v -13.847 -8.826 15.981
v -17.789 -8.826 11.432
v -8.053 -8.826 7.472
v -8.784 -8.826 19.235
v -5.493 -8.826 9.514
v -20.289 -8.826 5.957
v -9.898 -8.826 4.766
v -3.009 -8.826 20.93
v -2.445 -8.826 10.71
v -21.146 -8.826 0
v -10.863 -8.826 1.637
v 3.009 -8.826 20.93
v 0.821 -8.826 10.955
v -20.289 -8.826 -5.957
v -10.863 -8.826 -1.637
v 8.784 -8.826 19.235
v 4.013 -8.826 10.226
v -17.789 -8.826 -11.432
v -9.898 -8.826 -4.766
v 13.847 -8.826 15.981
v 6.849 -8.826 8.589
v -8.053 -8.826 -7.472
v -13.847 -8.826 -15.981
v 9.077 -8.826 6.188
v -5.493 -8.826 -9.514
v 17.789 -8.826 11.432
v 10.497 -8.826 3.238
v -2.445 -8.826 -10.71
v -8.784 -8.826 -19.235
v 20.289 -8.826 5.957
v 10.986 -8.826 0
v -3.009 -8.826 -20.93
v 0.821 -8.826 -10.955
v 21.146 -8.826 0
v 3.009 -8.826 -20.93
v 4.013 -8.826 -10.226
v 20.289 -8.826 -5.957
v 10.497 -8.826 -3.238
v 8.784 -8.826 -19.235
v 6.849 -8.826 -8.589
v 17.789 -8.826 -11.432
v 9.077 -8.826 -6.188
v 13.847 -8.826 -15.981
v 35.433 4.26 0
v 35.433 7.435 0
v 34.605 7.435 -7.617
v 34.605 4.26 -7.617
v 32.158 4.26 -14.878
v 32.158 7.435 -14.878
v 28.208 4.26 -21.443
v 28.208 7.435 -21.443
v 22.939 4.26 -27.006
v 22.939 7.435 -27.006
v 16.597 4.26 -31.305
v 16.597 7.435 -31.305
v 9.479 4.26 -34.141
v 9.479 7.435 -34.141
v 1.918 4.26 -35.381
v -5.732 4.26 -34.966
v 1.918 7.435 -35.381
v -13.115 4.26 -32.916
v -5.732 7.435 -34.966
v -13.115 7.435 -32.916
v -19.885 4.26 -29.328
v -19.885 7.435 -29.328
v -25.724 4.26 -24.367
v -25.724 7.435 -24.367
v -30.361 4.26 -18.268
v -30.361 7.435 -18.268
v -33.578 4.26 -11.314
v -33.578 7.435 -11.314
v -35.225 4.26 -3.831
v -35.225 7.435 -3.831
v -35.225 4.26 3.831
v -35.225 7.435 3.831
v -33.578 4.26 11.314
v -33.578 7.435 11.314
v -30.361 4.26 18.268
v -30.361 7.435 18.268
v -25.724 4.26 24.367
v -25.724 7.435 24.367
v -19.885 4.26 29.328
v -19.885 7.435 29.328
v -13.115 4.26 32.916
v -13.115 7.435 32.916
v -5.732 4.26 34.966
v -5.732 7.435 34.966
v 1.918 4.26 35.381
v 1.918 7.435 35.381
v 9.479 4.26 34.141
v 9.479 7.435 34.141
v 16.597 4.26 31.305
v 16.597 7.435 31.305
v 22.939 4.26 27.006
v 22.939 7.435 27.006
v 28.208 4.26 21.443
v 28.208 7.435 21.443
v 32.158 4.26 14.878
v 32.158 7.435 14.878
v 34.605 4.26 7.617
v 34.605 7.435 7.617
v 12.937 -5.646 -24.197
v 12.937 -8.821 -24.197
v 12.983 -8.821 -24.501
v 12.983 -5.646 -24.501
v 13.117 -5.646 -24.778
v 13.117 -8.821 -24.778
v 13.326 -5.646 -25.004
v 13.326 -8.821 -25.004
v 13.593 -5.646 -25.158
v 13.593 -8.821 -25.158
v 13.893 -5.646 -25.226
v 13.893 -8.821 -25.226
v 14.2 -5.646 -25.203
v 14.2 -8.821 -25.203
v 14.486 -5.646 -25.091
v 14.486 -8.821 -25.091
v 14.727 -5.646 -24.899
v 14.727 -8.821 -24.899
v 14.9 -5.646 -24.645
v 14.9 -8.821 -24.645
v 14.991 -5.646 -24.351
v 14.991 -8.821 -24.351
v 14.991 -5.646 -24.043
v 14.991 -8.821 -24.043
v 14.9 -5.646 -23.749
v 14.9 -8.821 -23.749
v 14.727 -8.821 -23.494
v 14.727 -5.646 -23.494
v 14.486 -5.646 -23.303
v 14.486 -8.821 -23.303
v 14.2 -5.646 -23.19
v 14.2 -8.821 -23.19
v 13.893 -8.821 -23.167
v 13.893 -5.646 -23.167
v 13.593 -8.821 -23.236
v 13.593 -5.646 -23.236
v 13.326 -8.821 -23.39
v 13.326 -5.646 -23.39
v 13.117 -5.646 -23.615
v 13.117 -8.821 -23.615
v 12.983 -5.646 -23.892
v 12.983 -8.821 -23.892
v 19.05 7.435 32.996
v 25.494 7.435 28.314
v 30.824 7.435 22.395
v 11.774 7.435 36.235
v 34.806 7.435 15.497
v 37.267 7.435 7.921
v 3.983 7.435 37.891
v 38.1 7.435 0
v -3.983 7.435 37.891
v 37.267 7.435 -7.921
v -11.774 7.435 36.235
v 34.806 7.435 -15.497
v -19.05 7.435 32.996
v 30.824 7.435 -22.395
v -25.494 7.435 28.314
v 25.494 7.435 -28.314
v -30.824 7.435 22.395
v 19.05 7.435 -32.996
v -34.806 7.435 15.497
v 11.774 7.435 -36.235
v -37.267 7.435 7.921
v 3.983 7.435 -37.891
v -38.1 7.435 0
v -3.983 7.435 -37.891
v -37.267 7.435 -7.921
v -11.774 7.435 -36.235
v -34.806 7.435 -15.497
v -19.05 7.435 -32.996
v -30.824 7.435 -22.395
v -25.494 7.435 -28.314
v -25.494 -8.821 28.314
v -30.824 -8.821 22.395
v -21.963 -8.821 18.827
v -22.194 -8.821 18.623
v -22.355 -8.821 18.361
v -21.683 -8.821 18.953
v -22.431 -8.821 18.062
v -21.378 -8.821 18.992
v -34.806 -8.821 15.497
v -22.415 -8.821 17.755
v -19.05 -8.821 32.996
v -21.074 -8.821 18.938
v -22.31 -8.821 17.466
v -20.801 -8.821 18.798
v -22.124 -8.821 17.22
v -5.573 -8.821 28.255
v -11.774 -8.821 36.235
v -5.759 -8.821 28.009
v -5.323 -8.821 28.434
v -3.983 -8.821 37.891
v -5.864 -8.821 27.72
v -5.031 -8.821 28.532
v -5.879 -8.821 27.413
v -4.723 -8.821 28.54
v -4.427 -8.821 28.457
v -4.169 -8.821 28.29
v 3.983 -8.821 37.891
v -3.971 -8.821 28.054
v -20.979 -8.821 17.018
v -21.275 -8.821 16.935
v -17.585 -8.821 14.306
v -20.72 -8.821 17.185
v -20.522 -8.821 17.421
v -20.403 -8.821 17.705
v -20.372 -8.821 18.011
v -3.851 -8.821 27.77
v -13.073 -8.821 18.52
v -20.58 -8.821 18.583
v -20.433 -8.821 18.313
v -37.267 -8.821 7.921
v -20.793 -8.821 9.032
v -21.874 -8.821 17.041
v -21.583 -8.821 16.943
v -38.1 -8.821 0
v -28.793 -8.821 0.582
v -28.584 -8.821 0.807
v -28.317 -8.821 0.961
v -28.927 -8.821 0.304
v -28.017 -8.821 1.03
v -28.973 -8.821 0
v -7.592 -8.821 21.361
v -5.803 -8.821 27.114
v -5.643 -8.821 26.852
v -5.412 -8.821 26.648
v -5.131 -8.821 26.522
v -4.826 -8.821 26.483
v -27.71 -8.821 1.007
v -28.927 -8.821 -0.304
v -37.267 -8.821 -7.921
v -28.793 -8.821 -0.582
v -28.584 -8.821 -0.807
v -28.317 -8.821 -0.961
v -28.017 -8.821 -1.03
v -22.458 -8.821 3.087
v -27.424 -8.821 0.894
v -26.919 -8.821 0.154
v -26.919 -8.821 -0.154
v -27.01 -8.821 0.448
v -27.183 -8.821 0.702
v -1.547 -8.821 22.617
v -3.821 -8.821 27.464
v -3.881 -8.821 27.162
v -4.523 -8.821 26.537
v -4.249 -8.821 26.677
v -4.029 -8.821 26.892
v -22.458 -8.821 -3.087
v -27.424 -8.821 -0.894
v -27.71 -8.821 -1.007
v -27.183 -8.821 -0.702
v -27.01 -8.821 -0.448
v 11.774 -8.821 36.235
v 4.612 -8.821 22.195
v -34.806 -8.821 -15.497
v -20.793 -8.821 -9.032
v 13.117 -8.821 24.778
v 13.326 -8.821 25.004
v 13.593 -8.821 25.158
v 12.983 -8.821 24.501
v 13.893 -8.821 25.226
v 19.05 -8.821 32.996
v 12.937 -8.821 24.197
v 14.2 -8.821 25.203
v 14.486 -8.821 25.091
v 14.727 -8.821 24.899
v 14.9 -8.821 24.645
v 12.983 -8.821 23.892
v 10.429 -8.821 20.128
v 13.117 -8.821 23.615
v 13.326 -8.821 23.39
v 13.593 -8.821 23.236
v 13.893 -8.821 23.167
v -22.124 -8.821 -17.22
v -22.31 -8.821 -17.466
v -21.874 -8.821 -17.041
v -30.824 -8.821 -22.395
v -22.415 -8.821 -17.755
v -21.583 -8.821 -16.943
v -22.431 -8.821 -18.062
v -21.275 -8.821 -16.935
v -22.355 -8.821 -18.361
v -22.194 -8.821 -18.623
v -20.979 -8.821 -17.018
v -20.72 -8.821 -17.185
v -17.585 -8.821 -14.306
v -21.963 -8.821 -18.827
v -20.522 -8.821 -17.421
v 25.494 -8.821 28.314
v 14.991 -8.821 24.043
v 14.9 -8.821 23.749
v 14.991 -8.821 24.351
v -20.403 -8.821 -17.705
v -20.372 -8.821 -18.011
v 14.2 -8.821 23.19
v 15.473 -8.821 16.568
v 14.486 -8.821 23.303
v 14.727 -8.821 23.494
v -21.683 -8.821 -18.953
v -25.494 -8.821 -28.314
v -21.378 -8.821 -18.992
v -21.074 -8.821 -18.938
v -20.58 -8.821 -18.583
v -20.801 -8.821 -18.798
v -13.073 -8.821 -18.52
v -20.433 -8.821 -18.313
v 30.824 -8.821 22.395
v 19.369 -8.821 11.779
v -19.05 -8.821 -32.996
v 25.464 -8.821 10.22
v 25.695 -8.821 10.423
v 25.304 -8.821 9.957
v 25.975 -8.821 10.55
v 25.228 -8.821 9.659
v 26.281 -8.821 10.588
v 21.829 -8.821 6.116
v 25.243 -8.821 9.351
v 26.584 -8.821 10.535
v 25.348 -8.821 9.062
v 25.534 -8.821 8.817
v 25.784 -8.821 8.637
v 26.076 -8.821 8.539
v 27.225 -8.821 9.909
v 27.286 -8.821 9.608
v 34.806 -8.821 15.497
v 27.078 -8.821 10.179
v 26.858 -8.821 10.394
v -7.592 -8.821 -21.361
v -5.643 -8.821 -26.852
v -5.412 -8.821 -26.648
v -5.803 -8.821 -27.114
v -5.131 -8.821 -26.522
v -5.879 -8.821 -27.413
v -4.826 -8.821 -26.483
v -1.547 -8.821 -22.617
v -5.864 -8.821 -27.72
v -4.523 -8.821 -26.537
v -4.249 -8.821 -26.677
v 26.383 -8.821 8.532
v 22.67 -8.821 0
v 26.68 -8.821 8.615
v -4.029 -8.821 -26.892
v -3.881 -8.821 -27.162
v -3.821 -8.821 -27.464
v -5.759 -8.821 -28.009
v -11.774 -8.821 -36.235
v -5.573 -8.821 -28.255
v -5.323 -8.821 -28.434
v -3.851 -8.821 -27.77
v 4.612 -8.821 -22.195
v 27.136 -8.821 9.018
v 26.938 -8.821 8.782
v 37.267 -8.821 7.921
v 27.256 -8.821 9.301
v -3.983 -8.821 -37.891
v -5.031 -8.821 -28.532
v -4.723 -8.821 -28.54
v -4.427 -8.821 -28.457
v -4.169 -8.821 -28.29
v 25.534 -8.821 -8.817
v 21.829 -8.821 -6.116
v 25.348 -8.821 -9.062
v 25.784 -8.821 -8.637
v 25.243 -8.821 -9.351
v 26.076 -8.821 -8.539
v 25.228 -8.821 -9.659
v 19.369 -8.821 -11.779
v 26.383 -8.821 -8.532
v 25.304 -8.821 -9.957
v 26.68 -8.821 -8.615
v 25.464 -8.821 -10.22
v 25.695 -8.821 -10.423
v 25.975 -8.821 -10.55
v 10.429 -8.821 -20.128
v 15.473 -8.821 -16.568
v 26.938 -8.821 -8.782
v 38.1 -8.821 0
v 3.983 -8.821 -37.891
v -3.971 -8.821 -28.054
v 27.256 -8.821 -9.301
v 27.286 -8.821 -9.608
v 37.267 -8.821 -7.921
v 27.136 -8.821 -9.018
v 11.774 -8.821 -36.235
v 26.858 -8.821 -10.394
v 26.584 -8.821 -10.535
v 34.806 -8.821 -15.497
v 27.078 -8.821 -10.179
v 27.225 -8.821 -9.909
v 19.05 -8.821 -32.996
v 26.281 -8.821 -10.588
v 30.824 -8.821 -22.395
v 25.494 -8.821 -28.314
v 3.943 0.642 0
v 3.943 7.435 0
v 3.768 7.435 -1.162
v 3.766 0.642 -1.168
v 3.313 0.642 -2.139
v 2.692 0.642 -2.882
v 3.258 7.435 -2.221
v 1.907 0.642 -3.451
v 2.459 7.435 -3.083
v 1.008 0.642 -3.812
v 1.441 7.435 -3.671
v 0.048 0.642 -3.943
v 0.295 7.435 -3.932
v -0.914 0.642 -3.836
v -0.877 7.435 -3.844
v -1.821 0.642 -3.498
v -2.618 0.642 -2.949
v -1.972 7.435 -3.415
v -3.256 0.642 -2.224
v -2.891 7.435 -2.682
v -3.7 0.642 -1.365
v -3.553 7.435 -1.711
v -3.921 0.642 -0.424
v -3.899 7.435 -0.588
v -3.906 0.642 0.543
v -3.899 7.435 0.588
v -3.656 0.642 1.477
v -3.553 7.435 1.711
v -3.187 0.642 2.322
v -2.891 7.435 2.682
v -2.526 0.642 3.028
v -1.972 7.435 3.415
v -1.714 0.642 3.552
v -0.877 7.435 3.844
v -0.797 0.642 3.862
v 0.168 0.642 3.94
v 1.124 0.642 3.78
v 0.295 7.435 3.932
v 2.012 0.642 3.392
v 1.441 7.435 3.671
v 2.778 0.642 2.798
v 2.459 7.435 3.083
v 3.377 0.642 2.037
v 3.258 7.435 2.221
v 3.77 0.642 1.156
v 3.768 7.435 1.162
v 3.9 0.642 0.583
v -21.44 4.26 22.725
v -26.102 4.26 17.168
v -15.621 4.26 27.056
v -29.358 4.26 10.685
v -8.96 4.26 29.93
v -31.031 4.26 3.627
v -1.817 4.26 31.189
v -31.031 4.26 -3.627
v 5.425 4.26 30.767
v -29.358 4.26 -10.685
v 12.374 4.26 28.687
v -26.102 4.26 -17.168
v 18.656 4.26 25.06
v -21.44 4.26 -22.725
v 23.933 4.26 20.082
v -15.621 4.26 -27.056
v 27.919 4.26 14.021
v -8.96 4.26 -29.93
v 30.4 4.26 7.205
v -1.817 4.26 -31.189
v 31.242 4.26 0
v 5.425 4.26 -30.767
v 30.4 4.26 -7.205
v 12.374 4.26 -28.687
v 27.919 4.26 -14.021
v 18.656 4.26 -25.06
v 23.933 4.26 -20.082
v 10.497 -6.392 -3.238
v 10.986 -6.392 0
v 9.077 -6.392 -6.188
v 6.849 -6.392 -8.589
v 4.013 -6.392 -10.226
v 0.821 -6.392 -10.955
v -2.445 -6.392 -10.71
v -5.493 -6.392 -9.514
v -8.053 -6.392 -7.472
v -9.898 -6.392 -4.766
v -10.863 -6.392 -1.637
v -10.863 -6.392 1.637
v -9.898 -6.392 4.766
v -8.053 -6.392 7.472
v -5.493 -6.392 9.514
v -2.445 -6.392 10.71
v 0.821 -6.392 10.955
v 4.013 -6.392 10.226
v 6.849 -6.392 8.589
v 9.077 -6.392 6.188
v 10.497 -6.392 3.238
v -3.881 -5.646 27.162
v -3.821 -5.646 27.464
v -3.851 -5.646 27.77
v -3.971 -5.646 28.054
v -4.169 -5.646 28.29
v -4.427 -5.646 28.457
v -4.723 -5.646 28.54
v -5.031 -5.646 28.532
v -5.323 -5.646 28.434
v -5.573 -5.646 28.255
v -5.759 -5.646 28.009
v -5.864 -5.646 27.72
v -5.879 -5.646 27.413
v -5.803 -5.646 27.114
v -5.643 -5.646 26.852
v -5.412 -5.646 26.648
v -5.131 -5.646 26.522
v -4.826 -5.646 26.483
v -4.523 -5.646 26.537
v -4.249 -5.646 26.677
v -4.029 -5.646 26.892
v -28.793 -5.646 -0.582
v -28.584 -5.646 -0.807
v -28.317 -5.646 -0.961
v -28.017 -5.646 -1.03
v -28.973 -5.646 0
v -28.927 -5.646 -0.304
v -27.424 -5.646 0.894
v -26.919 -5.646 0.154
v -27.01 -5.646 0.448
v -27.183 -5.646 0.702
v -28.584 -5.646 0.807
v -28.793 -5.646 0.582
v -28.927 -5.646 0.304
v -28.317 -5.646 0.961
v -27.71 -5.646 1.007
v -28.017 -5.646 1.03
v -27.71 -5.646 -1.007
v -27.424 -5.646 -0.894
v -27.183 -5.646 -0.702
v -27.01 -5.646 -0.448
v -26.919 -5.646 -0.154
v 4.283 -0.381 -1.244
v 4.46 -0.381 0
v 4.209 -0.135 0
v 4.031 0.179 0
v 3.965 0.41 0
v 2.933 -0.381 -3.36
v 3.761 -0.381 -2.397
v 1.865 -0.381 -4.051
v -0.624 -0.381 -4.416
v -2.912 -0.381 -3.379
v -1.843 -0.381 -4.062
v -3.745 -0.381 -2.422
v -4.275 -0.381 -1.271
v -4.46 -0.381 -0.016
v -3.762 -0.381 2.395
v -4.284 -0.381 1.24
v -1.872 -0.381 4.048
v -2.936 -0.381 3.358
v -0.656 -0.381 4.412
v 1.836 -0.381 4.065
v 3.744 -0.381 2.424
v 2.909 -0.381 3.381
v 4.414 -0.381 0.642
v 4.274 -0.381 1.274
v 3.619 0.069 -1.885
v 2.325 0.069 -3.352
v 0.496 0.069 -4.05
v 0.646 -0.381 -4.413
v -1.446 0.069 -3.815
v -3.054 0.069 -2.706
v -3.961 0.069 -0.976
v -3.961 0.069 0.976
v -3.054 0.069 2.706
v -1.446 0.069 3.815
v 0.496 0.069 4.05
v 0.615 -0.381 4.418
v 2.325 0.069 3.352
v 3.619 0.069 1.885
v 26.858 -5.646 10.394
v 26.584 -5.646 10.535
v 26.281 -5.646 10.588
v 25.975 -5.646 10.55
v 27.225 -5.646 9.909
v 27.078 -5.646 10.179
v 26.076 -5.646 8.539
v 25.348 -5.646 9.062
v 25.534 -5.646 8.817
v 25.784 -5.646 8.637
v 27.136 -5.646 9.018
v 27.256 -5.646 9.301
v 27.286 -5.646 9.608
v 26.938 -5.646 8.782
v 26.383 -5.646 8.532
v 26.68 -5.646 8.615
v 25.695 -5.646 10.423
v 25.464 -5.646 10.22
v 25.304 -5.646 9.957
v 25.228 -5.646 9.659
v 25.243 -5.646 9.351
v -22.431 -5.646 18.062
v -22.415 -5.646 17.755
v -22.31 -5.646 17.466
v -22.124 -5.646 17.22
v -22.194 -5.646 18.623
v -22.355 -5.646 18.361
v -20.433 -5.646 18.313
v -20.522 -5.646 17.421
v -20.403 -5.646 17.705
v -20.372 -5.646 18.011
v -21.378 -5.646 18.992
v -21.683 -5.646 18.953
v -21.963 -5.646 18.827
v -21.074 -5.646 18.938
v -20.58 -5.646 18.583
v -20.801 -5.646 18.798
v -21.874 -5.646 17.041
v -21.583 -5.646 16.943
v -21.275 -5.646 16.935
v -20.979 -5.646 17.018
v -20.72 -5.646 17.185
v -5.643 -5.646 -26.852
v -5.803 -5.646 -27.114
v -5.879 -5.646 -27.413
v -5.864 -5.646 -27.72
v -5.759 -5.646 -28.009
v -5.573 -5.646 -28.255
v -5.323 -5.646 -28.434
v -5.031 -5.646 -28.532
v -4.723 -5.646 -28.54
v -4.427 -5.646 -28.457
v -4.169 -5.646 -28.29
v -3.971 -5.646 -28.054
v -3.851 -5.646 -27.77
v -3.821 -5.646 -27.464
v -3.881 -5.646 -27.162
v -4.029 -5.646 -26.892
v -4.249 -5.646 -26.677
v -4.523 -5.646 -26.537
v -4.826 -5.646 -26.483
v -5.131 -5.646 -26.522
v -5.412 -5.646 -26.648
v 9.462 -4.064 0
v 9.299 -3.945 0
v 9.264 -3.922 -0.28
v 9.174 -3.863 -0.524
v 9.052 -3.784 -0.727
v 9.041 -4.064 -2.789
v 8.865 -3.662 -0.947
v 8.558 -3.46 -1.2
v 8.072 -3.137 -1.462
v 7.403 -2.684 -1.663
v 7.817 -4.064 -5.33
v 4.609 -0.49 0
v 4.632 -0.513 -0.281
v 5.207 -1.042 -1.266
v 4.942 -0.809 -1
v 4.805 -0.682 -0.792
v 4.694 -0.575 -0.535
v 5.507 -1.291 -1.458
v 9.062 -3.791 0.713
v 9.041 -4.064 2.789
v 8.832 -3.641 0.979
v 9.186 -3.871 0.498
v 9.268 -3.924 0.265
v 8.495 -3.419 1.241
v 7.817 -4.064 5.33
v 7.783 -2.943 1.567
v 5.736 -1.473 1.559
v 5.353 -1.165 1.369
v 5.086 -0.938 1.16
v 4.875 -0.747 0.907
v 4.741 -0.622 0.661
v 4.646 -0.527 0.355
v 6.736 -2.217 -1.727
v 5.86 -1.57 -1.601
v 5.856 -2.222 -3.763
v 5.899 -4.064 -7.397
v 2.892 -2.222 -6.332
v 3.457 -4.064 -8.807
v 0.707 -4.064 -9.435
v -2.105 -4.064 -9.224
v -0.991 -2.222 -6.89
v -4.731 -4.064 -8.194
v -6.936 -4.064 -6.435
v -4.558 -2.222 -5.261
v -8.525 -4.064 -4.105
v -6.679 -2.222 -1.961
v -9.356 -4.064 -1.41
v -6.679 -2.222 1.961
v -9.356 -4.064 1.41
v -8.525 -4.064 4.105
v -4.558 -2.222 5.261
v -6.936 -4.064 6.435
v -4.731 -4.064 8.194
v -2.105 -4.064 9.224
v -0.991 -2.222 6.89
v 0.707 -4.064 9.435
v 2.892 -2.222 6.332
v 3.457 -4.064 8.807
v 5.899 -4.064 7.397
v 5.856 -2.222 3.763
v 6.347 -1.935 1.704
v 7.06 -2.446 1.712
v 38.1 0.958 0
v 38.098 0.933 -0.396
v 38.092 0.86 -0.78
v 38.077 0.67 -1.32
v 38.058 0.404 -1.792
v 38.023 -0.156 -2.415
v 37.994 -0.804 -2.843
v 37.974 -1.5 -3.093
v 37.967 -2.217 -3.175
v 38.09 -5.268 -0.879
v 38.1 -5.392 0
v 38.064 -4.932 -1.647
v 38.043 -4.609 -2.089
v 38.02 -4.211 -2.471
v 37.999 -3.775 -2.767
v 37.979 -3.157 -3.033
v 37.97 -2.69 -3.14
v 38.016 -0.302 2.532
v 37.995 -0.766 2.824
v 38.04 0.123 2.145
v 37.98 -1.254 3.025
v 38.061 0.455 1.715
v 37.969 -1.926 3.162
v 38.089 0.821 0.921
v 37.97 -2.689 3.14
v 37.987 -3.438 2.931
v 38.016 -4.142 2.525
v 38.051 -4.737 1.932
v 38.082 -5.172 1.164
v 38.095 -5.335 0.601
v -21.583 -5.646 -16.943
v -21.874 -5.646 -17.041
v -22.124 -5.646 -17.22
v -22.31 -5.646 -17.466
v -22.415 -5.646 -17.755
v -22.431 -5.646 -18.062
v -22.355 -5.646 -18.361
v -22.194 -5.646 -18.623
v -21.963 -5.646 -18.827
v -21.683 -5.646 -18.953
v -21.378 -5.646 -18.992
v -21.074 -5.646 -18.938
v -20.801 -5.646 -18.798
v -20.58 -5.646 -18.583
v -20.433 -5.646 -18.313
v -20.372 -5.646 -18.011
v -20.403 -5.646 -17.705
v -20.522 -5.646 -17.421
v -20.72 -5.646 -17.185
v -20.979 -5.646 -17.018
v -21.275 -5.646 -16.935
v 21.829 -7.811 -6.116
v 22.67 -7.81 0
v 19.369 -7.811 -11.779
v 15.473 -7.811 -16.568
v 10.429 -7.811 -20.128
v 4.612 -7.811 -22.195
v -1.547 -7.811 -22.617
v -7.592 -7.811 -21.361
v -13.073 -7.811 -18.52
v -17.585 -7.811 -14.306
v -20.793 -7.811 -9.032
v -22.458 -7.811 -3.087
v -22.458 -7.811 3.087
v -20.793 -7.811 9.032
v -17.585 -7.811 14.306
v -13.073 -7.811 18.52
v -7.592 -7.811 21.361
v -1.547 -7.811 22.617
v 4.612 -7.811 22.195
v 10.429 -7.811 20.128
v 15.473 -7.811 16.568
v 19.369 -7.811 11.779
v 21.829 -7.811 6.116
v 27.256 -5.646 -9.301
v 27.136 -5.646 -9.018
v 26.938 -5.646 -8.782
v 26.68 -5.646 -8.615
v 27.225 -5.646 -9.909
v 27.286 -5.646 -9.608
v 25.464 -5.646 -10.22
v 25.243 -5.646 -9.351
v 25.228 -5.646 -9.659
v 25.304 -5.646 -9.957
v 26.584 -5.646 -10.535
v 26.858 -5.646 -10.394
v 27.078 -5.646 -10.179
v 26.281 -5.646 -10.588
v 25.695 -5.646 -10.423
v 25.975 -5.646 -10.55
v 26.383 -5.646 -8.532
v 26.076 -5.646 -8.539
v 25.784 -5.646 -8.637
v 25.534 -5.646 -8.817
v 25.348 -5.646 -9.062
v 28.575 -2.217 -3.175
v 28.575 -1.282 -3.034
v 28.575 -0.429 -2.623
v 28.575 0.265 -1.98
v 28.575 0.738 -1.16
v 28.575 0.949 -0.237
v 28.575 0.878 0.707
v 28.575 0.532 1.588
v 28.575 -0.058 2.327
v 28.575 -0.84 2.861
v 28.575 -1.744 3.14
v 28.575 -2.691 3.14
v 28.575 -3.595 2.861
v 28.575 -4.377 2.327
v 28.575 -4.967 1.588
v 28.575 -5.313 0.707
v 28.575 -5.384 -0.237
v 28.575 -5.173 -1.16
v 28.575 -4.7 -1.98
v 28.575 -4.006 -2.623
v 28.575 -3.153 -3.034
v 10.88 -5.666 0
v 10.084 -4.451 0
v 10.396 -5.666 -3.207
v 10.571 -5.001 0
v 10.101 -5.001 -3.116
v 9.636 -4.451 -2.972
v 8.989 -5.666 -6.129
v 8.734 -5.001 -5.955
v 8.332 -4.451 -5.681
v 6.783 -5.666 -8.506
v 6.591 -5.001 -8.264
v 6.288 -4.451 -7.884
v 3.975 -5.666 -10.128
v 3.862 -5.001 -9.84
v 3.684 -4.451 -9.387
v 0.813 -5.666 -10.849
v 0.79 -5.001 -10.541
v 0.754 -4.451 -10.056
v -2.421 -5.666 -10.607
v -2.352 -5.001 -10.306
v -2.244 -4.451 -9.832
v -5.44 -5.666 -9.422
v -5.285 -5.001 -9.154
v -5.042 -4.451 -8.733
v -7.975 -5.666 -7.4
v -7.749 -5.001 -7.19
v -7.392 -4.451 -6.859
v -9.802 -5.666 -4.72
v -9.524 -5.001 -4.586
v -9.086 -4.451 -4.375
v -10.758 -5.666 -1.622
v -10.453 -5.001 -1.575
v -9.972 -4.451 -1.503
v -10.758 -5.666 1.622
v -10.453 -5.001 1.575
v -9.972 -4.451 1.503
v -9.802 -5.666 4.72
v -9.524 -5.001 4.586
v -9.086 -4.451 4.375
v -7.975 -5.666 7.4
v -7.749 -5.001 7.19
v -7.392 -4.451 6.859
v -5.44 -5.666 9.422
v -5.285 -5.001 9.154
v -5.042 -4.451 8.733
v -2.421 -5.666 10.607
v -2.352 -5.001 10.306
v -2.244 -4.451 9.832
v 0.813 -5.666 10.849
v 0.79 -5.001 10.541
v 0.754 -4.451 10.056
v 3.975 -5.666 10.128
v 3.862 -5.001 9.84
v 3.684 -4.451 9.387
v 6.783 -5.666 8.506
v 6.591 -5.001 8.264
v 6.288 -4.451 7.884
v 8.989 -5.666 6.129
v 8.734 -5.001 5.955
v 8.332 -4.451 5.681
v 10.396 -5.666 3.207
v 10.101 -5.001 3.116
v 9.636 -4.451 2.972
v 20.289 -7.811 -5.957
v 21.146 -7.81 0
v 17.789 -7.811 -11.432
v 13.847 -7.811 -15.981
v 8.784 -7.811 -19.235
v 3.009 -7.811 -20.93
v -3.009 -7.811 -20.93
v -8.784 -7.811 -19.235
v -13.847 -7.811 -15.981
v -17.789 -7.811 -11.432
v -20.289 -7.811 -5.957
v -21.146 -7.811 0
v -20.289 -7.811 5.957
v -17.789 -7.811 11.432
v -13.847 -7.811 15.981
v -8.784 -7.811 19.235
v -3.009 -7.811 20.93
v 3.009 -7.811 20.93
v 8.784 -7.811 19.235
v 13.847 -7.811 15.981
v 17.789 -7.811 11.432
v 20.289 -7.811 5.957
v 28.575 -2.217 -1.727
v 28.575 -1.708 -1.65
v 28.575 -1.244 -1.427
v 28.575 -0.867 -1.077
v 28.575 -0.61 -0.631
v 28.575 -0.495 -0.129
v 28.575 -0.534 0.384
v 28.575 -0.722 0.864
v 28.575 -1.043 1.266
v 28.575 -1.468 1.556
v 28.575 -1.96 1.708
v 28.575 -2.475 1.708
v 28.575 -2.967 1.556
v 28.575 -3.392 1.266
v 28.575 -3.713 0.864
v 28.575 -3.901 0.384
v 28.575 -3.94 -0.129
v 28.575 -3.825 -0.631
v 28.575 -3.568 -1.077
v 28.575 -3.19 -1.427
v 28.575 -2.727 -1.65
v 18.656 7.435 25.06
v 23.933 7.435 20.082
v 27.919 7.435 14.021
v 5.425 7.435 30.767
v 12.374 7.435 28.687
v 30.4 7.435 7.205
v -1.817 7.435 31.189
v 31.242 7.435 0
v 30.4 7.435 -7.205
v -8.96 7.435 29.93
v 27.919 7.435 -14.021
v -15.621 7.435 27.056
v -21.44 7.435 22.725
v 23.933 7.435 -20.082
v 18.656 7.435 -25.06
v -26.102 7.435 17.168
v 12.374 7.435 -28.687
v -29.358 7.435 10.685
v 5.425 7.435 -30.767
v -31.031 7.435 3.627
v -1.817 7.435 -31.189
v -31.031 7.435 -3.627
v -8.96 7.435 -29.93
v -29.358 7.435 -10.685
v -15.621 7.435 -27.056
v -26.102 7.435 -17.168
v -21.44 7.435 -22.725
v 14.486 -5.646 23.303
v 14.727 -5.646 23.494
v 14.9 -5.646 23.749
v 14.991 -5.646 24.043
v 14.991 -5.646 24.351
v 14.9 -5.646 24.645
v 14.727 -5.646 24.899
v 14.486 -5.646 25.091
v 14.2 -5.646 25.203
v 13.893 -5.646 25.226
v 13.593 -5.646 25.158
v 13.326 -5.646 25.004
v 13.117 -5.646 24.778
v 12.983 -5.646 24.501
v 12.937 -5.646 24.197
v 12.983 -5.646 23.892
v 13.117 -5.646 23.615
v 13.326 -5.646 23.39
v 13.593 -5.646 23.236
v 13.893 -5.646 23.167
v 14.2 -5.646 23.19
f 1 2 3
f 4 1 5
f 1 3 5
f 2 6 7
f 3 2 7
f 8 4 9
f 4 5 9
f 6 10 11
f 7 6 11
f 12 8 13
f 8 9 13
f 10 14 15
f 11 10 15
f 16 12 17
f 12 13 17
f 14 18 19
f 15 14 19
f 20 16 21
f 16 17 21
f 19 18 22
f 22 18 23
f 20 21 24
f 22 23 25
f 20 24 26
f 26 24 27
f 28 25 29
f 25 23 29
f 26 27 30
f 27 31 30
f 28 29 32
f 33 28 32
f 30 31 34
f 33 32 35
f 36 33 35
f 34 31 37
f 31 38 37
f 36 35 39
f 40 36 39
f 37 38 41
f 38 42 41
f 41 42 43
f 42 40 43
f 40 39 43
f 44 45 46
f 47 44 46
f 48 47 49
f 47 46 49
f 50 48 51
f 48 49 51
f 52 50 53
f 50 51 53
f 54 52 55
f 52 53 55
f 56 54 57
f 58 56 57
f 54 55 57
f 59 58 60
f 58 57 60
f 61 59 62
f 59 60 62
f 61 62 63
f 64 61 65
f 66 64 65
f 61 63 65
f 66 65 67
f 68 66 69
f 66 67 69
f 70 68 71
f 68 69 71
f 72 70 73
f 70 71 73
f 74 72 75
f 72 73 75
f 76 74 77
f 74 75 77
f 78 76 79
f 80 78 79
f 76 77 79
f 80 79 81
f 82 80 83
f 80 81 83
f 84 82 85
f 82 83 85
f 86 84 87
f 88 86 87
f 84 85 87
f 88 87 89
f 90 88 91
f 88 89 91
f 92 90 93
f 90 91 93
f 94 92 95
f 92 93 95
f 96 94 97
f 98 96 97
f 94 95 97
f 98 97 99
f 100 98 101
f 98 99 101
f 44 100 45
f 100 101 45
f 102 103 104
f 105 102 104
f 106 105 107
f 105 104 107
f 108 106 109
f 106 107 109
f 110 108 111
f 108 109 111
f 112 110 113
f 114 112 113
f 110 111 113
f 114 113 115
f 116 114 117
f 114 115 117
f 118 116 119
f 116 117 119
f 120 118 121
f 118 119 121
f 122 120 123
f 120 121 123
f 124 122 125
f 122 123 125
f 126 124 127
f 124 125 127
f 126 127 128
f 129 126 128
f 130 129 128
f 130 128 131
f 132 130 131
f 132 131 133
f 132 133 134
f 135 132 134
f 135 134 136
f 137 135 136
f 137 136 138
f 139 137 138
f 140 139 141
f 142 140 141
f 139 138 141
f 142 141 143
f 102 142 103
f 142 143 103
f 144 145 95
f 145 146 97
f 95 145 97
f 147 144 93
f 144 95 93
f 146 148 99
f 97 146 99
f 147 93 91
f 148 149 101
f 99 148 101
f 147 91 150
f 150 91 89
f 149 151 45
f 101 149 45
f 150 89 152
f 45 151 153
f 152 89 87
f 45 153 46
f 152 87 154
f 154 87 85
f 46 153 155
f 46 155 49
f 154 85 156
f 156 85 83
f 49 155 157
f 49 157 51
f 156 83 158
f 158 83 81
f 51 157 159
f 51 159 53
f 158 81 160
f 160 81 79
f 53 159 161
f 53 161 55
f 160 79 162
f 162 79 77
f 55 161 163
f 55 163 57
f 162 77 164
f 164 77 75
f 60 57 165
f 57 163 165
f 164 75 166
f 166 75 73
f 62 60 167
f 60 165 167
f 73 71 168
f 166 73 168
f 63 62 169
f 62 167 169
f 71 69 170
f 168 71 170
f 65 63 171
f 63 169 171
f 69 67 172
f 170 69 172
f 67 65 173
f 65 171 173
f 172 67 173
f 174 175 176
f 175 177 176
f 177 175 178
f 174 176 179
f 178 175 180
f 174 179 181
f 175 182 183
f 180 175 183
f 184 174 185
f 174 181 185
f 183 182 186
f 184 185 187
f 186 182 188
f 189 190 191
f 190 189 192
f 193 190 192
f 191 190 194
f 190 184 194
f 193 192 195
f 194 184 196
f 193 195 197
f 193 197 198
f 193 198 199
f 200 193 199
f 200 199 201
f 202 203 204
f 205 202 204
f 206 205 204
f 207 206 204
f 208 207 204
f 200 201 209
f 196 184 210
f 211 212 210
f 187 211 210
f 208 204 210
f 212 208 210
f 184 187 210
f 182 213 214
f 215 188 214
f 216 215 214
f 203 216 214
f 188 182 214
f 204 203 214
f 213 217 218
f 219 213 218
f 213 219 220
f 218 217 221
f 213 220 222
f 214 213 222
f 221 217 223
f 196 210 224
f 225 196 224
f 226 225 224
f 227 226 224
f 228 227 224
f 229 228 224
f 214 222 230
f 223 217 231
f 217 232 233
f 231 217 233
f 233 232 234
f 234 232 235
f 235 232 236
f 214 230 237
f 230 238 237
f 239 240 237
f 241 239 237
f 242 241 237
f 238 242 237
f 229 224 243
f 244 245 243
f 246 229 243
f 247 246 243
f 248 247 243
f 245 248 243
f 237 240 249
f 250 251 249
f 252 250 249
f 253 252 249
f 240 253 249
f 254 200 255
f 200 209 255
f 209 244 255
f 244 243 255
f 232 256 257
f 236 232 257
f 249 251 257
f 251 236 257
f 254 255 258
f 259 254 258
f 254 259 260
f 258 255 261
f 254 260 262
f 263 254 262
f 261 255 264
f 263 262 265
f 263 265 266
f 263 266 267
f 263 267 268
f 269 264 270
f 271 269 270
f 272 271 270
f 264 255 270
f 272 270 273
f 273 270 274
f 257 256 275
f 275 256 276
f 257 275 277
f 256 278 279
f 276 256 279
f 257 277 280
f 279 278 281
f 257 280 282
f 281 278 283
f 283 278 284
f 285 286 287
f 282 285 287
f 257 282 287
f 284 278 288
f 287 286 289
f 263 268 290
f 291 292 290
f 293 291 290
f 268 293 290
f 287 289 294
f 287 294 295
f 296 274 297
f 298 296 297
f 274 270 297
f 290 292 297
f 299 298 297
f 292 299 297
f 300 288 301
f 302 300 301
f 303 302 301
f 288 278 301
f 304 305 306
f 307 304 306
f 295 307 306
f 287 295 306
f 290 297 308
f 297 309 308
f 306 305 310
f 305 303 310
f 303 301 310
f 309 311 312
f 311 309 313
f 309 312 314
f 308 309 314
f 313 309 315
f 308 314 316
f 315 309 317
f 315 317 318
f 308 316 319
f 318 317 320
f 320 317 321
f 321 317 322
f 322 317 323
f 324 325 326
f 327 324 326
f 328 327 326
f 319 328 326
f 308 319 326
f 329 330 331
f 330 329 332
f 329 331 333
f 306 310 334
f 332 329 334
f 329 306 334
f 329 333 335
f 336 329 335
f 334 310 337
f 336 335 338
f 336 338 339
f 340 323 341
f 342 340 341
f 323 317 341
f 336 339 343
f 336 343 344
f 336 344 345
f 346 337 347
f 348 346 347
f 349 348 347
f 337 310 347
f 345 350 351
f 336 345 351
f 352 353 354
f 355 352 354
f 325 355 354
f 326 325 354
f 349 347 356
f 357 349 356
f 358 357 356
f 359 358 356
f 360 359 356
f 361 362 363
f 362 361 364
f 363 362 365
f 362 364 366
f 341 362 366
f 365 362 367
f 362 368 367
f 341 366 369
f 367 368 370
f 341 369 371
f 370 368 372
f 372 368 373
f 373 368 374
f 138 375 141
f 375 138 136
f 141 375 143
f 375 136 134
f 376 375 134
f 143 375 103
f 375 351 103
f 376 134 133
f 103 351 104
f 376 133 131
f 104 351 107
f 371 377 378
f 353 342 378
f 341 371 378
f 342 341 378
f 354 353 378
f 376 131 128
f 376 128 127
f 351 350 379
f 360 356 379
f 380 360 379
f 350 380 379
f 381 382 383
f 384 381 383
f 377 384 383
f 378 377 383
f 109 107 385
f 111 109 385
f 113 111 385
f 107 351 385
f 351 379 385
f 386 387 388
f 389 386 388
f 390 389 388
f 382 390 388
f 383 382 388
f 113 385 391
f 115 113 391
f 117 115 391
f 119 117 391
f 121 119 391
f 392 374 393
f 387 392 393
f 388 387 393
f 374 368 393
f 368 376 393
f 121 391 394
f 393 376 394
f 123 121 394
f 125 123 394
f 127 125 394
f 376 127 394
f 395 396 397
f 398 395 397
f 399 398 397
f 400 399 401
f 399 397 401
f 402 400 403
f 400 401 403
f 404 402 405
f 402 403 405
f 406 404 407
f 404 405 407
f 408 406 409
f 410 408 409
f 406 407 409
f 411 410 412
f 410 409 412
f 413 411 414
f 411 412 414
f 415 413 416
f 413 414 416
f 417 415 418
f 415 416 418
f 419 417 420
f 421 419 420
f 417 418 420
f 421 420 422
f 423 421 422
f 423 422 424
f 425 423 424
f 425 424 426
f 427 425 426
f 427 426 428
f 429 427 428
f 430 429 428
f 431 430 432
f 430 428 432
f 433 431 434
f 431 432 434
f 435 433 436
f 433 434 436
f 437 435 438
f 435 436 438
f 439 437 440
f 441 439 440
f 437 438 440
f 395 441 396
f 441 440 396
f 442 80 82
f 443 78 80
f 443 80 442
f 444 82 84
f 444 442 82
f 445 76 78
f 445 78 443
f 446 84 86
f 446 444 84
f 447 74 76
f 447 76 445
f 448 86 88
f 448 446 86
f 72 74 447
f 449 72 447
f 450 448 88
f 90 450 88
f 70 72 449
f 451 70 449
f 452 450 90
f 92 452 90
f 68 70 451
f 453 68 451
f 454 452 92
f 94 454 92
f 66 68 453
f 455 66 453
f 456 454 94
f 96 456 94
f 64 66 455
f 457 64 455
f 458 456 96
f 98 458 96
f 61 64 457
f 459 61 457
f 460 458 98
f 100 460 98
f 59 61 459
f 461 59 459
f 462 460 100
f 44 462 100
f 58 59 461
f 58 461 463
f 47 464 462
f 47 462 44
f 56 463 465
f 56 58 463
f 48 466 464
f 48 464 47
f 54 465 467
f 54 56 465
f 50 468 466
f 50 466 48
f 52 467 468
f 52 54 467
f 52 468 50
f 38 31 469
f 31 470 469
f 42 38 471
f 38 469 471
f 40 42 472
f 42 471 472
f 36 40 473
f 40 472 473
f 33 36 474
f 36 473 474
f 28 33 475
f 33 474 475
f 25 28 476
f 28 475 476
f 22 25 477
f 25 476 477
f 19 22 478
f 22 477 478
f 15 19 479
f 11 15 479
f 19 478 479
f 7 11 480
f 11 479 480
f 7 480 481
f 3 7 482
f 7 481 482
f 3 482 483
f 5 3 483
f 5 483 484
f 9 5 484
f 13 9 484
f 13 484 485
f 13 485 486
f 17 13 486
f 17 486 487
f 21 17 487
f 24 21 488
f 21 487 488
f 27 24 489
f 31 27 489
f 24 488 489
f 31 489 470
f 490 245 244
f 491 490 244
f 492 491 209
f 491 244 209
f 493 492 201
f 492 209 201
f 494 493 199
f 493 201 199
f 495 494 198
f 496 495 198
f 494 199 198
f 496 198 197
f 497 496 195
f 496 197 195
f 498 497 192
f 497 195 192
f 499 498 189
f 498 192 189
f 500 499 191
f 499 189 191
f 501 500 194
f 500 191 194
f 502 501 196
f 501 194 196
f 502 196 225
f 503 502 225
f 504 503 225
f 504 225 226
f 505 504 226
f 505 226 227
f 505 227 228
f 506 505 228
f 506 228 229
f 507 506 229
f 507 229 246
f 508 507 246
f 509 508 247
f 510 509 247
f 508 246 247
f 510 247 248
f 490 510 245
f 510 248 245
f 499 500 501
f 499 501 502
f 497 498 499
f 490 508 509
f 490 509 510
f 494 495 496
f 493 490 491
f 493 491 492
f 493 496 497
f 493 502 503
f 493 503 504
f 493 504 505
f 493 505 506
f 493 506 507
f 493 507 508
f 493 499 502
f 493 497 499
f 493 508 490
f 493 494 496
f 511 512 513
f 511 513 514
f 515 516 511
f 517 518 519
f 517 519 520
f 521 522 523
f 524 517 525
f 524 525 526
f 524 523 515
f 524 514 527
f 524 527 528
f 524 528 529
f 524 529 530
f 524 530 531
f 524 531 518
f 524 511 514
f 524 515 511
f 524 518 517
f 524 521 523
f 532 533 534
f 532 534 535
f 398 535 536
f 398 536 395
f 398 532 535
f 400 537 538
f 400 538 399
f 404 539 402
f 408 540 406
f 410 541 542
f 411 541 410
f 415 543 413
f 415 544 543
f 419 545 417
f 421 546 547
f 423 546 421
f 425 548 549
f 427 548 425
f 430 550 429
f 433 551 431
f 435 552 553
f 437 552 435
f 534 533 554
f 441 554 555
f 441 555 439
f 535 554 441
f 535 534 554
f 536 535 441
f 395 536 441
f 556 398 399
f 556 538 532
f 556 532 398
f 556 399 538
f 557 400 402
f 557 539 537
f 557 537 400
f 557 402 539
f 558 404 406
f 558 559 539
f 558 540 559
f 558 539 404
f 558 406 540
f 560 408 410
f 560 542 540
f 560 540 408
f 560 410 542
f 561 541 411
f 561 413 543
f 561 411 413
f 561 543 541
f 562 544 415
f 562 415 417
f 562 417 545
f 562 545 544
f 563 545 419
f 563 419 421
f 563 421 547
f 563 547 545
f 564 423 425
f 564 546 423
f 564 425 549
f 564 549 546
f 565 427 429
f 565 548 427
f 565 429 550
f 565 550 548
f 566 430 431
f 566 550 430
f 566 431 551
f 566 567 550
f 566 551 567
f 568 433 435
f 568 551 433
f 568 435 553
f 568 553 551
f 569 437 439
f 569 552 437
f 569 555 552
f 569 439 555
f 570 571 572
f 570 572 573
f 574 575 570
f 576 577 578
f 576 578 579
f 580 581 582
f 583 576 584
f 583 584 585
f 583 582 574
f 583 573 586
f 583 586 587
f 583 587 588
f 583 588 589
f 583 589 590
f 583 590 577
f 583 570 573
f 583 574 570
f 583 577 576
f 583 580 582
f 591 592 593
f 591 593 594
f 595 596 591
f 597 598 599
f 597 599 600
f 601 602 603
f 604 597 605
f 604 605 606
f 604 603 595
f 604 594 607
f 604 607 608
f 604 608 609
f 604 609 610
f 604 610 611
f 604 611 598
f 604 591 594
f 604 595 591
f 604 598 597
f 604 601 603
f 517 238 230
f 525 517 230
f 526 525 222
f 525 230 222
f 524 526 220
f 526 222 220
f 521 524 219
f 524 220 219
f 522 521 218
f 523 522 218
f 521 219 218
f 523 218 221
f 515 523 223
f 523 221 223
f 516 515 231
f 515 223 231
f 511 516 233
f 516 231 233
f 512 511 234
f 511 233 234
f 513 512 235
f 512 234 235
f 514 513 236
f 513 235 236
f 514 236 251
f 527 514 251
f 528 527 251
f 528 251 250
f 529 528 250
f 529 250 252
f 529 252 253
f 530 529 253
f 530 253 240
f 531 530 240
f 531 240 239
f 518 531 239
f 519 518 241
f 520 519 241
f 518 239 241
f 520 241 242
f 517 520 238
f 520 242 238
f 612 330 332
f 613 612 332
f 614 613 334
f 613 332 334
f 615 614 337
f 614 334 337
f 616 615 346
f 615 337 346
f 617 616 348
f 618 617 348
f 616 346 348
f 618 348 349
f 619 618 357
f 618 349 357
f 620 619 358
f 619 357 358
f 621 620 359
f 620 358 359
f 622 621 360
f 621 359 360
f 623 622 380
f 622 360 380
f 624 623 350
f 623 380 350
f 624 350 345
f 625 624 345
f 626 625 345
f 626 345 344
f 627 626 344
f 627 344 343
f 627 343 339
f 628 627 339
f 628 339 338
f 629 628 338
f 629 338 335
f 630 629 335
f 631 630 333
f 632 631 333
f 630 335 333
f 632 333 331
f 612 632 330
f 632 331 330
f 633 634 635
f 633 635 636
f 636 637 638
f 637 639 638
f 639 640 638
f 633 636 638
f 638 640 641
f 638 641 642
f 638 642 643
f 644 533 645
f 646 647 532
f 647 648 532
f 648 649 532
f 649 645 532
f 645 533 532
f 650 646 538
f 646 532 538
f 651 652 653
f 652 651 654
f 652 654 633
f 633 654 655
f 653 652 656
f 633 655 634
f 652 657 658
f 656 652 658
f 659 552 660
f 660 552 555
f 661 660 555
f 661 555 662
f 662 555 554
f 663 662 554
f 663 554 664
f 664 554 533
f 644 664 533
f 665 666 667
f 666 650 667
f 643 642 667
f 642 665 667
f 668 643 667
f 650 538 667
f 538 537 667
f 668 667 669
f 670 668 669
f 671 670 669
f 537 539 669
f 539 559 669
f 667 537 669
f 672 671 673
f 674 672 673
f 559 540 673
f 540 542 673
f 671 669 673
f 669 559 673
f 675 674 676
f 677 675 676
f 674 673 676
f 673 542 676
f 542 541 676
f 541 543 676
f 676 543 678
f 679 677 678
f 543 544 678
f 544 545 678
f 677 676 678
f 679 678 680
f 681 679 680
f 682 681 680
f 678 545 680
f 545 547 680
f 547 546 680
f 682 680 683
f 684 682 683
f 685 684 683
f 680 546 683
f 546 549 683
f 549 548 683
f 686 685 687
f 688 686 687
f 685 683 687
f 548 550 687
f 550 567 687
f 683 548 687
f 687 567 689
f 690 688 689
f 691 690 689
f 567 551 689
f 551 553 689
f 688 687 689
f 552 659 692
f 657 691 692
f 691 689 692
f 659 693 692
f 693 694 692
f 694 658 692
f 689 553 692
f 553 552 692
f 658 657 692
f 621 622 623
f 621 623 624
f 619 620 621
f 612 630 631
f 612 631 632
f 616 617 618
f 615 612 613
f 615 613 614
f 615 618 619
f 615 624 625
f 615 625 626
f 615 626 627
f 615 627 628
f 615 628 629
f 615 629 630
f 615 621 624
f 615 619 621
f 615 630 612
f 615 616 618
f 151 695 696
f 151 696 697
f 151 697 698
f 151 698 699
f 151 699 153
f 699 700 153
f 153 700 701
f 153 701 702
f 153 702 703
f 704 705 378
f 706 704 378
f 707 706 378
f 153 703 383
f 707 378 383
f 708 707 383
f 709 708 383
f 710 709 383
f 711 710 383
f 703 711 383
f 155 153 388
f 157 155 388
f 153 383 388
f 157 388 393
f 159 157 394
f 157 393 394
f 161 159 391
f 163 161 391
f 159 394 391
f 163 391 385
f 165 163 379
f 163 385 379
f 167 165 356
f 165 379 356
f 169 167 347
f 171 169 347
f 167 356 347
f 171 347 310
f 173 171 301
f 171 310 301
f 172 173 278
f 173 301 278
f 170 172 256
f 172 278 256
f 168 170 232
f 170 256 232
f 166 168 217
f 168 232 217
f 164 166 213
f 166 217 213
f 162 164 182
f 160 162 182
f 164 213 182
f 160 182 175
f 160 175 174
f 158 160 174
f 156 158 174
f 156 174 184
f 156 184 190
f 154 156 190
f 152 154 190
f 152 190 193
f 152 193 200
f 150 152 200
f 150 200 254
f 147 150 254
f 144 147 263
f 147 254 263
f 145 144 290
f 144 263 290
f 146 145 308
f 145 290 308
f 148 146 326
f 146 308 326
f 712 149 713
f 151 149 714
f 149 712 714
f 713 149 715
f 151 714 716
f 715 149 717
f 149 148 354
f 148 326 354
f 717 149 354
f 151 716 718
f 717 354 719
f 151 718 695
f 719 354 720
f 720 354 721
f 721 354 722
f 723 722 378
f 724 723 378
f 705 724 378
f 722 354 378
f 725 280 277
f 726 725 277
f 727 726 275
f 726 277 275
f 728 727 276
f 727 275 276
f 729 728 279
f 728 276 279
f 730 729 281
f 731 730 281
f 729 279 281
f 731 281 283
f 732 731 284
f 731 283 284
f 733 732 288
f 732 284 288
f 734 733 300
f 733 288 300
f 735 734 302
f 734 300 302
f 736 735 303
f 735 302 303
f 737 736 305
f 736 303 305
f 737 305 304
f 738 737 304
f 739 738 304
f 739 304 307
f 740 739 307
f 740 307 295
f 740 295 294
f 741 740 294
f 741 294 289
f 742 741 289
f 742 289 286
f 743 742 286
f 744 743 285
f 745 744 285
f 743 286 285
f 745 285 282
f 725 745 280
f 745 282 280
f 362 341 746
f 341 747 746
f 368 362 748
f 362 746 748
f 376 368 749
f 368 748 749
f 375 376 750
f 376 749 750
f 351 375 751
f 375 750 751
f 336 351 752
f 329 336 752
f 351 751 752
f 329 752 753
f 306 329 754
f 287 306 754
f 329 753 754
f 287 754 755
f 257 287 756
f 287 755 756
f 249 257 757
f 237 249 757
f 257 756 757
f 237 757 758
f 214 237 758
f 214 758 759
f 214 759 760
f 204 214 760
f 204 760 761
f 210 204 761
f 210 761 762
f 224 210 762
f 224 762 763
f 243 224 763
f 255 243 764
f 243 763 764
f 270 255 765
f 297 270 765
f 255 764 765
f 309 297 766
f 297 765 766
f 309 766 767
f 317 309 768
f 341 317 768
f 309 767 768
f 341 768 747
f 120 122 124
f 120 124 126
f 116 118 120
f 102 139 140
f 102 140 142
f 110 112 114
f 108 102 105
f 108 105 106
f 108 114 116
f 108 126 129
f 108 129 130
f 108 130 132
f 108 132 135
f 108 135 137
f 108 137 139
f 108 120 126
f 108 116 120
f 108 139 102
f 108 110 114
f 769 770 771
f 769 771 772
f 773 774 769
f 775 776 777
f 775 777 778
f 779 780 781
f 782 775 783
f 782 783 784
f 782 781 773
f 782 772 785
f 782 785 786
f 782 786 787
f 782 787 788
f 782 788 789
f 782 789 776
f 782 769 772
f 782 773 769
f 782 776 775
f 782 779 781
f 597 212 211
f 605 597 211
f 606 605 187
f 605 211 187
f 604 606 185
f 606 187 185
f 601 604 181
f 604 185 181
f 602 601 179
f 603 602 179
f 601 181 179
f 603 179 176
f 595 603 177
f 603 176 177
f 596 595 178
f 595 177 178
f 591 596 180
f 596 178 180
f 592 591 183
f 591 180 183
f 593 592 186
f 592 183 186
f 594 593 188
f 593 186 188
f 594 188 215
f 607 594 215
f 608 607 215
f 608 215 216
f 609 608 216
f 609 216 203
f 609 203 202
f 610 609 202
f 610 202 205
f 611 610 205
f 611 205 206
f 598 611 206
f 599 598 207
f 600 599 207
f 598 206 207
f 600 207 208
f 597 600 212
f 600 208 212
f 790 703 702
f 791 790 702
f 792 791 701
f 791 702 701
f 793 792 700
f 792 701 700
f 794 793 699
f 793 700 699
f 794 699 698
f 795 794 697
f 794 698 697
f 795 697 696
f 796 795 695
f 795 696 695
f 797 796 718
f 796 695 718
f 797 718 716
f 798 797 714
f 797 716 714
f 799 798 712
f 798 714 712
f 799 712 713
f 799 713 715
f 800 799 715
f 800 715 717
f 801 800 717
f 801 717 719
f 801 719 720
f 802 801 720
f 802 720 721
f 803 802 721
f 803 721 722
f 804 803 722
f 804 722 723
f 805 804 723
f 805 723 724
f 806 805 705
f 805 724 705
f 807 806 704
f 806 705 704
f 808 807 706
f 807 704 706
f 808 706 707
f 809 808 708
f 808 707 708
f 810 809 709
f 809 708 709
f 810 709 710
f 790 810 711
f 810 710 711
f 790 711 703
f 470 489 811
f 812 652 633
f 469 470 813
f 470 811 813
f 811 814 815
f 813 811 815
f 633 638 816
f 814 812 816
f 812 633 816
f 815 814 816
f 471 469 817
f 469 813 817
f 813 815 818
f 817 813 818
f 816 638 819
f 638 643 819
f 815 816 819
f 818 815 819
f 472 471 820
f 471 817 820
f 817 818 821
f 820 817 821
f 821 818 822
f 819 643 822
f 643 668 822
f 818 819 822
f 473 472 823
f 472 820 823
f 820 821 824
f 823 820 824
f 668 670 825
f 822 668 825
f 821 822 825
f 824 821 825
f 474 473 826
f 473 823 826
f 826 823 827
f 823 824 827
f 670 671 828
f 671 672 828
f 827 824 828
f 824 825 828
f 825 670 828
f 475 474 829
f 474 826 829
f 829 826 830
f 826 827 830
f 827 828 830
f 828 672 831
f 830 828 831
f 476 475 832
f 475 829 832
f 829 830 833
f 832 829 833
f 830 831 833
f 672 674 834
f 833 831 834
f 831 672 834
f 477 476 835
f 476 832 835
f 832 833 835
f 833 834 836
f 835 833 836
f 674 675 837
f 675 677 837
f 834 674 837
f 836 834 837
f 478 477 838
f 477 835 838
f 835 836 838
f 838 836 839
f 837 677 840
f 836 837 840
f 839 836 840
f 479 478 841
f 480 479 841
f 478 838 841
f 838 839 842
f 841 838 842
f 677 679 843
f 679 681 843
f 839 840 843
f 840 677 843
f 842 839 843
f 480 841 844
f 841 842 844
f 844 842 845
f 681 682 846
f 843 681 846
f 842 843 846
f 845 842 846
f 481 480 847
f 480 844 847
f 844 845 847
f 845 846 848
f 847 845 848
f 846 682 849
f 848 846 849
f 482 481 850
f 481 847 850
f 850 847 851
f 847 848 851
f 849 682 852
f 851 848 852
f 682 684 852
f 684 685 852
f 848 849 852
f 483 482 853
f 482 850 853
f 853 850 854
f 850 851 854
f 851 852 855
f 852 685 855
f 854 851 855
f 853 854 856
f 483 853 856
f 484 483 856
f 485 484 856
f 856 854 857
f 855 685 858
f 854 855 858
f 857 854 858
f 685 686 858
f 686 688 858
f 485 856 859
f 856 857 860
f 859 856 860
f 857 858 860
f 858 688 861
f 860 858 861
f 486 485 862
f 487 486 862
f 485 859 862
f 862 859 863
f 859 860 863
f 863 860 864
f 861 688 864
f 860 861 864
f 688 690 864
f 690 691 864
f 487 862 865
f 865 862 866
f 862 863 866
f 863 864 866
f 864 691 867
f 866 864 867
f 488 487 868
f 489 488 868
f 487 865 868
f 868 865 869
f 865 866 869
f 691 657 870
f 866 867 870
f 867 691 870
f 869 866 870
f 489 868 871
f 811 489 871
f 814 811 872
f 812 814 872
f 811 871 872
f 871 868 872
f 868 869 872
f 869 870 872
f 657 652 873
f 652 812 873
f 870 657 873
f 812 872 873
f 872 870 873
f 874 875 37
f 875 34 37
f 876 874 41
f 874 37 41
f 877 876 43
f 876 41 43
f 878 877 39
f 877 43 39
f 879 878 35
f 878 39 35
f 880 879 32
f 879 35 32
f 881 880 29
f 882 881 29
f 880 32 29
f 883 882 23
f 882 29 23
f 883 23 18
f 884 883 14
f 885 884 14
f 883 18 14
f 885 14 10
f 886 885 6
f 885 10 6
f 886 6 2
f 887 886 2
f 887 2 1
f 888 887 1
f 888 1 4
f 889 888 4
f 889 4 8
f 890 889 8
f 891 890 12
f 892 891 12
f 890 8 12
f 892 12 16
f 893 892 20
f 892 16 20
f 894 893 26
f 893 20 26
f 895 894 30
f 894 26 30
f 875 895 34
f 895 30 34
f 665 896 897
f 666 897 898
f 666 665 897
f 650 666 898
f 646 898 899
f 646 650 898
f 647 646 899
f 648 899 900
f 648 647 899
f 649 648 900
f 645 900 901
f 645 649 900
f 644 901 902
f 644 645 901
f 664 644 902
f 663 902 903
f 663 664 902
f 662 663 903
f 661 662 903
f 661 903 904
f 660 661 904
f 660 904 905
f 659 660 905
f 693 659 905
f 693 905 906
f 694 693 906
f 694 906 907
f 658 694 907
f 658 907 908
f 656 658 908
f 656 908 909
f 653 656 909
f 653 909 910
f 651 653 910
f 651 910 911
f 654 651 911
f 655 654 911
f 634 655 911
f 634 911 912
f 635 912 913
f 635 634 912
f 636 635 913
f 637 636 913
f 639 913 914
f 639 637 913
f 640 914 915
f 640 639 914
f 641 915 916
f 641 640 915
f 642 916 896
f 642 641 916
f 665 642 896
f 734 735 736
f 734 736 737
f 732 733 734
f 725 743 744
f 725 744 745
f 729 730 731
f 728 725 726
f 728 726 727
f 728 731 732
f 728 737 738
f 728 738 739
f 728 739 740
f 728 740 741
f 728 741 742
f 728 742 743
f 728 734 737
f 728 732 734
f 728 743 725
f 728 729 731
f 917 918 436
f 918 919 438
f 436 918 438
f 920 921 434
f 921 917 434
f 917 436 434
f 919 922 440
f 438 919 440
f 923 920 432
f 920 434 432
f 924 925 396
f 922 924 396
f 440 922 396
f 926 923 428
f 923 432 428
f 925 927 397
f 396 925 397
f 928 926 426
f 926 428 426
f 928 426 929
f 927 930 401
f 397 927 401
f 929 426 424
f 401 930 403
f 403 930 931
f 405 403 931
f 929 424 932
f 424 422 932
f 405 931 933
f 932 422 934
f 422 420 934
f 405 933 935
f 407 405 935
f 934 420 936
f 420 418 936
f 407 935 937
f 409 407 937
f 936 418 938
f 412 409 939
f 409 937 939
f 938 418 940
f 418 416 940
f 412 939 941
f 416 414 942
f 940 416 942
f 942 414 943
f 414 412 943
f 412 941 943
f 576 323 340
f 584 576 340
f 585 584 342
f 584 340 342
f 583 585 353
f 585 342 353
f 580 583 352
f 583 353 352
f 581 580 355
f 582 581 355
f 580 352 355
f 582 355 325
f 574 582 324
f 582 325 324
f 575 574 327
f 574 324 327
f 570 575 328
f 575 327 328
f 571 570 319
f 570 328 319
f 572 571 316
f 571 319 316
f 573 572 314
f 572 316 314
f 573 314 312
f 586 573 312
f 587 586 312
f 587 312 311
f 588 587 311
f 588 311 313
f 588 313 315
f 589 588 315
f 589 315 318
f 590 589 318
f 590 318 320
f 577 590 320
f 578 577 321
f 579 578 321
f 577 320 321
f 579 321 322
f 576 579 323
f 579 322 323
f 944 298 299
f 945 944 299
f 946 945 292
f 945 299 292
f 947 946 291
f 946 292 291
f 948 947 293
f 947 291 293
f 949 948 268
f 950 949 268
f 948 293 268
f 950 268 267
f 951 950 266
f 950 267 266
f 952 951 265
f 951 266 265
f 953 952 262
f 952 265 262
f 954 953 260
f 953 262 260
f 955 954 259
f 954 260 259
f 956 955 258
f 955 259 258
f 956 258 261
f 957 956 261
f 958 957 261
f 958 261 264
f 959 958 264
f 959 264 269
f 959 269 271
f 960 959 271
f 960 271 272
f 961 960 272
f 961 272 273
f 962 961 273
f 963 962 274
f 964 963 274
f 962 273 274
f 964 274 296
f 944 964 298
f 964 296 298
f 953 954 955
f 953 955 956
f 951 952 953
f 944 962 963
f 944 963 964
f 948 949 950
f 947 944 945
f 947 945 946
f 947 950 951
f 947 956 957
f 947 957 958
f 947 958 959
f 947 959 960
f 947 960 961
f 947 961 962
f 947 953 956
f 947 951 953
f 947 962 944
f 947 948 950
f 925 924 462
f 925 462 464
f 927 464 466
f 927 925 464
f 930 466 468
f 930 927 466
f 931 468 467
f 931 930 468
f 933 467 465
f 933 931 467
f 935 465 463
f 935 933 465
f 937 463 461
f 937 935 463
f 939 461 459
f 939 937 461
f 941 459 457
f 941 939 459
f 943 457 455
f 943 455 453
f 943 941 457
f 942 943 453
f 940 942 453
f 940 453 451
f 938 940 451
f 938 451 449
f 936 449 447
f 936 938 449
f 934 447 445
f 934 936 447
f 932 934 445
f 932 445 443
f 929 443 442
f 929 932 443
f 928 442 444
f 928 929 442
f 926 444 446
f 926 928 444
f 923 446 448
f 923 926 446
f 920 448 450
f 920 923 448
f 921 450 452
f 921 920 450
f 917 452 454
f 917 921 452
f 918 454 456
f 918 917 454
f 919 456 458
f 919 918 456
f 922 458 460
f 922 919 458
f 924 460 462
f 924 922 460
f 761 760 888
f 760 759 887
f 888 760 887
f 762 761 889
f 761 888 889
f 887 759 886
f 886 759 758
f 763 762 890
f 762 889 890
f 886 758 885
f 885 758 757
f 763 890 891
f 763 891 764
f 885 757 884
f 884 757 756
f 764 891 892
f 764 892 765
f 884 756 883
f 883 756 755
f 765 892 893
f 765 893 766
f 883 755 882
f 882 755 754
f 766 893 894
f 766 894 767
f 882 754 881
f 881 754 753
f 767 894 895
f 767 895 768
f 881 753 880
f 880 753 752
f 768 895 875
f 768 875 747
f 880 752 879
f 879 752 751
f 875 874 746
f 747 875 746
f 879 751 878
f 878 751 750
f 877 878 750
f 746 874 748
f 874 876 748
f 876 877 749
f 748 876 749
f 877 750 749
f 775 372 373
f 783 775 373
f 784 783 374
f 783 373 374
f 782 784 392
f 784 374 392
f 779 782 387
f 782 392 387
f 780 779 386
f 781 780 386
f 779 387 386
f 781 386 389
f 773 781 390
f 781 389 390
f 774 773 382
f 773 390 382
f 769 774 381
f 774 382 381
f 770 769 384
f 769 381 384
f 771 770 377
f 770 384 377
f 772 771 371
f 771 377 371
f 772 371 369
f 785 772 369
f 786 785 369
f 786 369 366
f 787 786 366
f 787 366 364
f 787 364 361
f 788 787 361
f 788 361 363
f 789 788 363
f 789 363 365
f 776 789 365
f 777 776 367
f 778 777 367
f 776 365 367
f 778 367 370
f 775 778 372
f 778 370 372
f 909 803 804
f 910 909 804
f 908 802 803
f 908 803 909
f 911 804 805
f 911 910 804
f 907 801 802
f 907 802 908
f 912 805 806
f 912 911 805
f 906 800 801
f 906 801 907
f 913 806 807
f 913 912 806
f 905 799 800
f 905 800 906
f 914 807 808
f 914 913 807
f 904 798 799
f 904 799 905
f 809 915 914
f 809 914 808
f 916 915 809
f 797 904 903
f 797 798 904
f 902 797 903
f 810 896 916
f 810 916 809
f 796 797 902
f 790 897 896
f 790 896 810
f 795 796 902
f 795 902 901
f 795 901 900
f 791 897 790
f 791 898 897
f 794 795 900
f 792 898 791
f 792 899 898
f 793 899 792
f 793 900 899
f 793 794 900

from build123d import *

# Parameters (mm, degrees)
SKETCH2_R          = 1.7272
CUT_EXTRUDE1_DEPTH = 55.599698738
SKETCH3_R          = 35.433
SKETCH3_R_2        = 31.242
CUT_EXTRUDE2_DEPTH = 3.175
SKETCH4_R          = 1.03251
CUT_EXTRUDE3_DEPTH = 3.175
CIRPATTERN1_COUNT  = 9
SKETCH5_R          = 3.175
CUT_EXTRUDE4_DEPTH = 9.525
FILLET1_R          = 1.27


with BuildPart() as part:
    # Sketch1 → Revolve1 (revolve)
    with BuildSketch(Plane.XY):
        with BuildLine():
            Line((3.94335, 7.43458), (38.1, 7.43458))
            Line((38.1, 7.43458), (38.1, -8.82142))
            Line((38.1, -8.82142), (22.6695, -8.82142))
            Line((22.6695, -8.82142), (22.6695, -7.8105))
            Line((22.6695, -7.8105), (21.1455, -7.8105))
            Line((21.1455, -7.8105), (21.1455, -8.8265))
            Line((21.1455, -8.8265), (10.9855, -8.8265))
            Line((10.9855, -8.8265), (10.9855, -6.391948453))
            ThreePointArc((10.9855, -6.391948453), (10.570616467, -5.000733157), (9.4615, -4.064))
            Line((9.4615, -4.064), (3.94335, 0))
            Line((3.94335, 0), (3.94335, 7.43458))
        make_face()
    revolve(axis=Axis((0, 101.60464546, 0), (0, 1, 0)))

    # Sketch2 → Cut-Extrude1 (cut, through all)
    with BuildSketch(Plane(origin=(0, 0, 0), x_dir=(0, 0, -1), z_dir=(1, 0, 0))):
        with Locations((0, -2.21742)):
            Circle(SKETCH2_R)
    extrude(amount=CUT_EXTRUDE1_DEPTH, mode=Mode.SUBTRACT)

    # Sketch3 → Cut-Extrude2 (cut)
    with BuildSketch(Plane(origin=(0, 7.43458, 0), x_dir=(1, 0, 0), z_dir=(0, 1, 0))):
        Circle(SKETCH3_R)
        Circle(SKETCH3_R_2, mode=Mode.SUBTRACT)
    extrude(amount=-CUT_EXTRUDE2_DEPTH, mode=Mode.SUBTRACT)

    # Sketch4 → Cut-Extrude3 (cut)
    with BuildSketch(Plane(origin=(0, -8.82142, 0), x_dir=(-1, 0, 0), z_dir=(0, -1, 0))):
        with Locations((-13.97, 24.196749782)):
            Circle(SKETCH4_R)
    cut_extrude3 = extrude(amount=-CUT_EXTRUDE3_DEPTH, mode=Mode.SUBTRACT)

    # CirPattern1: Cut-Extrude3 ×9 about axis
    cirpattern1_axis = Axis((0, 7.43458, 0), (0, -1, 0))
    for i in range(1, CIRPATTERN1_COUNT):
        add(cut_extrude3.rotate(cirpattern1_axis, i * 360 / CIRPATTERN1_COUNT), mode=Mode.SUBTRACT)

    # Sketch5 → Cut-Extrude4 (cut)
    with BuildSketch(Plane(origin=(38.1, 0, 0), x_dir=(0, 0, -1), z_dir=(1, 0, 0))):
        with Locations((0, -2.21742)):
            Circle(SKETCH5_R)
    extrude(amount=-CUT_EXTRUDE4_DEPTH, mode=Mode.SUBTRACT)

    # Fillet1
    fillet1_edges = [part.edges().sort_by_distance(p)[0] for p in [
        (-3.94335, 0, 0),
    ]]
    fillet(fillet1_edges, radius=FILLET1_R)


solid = part.part
